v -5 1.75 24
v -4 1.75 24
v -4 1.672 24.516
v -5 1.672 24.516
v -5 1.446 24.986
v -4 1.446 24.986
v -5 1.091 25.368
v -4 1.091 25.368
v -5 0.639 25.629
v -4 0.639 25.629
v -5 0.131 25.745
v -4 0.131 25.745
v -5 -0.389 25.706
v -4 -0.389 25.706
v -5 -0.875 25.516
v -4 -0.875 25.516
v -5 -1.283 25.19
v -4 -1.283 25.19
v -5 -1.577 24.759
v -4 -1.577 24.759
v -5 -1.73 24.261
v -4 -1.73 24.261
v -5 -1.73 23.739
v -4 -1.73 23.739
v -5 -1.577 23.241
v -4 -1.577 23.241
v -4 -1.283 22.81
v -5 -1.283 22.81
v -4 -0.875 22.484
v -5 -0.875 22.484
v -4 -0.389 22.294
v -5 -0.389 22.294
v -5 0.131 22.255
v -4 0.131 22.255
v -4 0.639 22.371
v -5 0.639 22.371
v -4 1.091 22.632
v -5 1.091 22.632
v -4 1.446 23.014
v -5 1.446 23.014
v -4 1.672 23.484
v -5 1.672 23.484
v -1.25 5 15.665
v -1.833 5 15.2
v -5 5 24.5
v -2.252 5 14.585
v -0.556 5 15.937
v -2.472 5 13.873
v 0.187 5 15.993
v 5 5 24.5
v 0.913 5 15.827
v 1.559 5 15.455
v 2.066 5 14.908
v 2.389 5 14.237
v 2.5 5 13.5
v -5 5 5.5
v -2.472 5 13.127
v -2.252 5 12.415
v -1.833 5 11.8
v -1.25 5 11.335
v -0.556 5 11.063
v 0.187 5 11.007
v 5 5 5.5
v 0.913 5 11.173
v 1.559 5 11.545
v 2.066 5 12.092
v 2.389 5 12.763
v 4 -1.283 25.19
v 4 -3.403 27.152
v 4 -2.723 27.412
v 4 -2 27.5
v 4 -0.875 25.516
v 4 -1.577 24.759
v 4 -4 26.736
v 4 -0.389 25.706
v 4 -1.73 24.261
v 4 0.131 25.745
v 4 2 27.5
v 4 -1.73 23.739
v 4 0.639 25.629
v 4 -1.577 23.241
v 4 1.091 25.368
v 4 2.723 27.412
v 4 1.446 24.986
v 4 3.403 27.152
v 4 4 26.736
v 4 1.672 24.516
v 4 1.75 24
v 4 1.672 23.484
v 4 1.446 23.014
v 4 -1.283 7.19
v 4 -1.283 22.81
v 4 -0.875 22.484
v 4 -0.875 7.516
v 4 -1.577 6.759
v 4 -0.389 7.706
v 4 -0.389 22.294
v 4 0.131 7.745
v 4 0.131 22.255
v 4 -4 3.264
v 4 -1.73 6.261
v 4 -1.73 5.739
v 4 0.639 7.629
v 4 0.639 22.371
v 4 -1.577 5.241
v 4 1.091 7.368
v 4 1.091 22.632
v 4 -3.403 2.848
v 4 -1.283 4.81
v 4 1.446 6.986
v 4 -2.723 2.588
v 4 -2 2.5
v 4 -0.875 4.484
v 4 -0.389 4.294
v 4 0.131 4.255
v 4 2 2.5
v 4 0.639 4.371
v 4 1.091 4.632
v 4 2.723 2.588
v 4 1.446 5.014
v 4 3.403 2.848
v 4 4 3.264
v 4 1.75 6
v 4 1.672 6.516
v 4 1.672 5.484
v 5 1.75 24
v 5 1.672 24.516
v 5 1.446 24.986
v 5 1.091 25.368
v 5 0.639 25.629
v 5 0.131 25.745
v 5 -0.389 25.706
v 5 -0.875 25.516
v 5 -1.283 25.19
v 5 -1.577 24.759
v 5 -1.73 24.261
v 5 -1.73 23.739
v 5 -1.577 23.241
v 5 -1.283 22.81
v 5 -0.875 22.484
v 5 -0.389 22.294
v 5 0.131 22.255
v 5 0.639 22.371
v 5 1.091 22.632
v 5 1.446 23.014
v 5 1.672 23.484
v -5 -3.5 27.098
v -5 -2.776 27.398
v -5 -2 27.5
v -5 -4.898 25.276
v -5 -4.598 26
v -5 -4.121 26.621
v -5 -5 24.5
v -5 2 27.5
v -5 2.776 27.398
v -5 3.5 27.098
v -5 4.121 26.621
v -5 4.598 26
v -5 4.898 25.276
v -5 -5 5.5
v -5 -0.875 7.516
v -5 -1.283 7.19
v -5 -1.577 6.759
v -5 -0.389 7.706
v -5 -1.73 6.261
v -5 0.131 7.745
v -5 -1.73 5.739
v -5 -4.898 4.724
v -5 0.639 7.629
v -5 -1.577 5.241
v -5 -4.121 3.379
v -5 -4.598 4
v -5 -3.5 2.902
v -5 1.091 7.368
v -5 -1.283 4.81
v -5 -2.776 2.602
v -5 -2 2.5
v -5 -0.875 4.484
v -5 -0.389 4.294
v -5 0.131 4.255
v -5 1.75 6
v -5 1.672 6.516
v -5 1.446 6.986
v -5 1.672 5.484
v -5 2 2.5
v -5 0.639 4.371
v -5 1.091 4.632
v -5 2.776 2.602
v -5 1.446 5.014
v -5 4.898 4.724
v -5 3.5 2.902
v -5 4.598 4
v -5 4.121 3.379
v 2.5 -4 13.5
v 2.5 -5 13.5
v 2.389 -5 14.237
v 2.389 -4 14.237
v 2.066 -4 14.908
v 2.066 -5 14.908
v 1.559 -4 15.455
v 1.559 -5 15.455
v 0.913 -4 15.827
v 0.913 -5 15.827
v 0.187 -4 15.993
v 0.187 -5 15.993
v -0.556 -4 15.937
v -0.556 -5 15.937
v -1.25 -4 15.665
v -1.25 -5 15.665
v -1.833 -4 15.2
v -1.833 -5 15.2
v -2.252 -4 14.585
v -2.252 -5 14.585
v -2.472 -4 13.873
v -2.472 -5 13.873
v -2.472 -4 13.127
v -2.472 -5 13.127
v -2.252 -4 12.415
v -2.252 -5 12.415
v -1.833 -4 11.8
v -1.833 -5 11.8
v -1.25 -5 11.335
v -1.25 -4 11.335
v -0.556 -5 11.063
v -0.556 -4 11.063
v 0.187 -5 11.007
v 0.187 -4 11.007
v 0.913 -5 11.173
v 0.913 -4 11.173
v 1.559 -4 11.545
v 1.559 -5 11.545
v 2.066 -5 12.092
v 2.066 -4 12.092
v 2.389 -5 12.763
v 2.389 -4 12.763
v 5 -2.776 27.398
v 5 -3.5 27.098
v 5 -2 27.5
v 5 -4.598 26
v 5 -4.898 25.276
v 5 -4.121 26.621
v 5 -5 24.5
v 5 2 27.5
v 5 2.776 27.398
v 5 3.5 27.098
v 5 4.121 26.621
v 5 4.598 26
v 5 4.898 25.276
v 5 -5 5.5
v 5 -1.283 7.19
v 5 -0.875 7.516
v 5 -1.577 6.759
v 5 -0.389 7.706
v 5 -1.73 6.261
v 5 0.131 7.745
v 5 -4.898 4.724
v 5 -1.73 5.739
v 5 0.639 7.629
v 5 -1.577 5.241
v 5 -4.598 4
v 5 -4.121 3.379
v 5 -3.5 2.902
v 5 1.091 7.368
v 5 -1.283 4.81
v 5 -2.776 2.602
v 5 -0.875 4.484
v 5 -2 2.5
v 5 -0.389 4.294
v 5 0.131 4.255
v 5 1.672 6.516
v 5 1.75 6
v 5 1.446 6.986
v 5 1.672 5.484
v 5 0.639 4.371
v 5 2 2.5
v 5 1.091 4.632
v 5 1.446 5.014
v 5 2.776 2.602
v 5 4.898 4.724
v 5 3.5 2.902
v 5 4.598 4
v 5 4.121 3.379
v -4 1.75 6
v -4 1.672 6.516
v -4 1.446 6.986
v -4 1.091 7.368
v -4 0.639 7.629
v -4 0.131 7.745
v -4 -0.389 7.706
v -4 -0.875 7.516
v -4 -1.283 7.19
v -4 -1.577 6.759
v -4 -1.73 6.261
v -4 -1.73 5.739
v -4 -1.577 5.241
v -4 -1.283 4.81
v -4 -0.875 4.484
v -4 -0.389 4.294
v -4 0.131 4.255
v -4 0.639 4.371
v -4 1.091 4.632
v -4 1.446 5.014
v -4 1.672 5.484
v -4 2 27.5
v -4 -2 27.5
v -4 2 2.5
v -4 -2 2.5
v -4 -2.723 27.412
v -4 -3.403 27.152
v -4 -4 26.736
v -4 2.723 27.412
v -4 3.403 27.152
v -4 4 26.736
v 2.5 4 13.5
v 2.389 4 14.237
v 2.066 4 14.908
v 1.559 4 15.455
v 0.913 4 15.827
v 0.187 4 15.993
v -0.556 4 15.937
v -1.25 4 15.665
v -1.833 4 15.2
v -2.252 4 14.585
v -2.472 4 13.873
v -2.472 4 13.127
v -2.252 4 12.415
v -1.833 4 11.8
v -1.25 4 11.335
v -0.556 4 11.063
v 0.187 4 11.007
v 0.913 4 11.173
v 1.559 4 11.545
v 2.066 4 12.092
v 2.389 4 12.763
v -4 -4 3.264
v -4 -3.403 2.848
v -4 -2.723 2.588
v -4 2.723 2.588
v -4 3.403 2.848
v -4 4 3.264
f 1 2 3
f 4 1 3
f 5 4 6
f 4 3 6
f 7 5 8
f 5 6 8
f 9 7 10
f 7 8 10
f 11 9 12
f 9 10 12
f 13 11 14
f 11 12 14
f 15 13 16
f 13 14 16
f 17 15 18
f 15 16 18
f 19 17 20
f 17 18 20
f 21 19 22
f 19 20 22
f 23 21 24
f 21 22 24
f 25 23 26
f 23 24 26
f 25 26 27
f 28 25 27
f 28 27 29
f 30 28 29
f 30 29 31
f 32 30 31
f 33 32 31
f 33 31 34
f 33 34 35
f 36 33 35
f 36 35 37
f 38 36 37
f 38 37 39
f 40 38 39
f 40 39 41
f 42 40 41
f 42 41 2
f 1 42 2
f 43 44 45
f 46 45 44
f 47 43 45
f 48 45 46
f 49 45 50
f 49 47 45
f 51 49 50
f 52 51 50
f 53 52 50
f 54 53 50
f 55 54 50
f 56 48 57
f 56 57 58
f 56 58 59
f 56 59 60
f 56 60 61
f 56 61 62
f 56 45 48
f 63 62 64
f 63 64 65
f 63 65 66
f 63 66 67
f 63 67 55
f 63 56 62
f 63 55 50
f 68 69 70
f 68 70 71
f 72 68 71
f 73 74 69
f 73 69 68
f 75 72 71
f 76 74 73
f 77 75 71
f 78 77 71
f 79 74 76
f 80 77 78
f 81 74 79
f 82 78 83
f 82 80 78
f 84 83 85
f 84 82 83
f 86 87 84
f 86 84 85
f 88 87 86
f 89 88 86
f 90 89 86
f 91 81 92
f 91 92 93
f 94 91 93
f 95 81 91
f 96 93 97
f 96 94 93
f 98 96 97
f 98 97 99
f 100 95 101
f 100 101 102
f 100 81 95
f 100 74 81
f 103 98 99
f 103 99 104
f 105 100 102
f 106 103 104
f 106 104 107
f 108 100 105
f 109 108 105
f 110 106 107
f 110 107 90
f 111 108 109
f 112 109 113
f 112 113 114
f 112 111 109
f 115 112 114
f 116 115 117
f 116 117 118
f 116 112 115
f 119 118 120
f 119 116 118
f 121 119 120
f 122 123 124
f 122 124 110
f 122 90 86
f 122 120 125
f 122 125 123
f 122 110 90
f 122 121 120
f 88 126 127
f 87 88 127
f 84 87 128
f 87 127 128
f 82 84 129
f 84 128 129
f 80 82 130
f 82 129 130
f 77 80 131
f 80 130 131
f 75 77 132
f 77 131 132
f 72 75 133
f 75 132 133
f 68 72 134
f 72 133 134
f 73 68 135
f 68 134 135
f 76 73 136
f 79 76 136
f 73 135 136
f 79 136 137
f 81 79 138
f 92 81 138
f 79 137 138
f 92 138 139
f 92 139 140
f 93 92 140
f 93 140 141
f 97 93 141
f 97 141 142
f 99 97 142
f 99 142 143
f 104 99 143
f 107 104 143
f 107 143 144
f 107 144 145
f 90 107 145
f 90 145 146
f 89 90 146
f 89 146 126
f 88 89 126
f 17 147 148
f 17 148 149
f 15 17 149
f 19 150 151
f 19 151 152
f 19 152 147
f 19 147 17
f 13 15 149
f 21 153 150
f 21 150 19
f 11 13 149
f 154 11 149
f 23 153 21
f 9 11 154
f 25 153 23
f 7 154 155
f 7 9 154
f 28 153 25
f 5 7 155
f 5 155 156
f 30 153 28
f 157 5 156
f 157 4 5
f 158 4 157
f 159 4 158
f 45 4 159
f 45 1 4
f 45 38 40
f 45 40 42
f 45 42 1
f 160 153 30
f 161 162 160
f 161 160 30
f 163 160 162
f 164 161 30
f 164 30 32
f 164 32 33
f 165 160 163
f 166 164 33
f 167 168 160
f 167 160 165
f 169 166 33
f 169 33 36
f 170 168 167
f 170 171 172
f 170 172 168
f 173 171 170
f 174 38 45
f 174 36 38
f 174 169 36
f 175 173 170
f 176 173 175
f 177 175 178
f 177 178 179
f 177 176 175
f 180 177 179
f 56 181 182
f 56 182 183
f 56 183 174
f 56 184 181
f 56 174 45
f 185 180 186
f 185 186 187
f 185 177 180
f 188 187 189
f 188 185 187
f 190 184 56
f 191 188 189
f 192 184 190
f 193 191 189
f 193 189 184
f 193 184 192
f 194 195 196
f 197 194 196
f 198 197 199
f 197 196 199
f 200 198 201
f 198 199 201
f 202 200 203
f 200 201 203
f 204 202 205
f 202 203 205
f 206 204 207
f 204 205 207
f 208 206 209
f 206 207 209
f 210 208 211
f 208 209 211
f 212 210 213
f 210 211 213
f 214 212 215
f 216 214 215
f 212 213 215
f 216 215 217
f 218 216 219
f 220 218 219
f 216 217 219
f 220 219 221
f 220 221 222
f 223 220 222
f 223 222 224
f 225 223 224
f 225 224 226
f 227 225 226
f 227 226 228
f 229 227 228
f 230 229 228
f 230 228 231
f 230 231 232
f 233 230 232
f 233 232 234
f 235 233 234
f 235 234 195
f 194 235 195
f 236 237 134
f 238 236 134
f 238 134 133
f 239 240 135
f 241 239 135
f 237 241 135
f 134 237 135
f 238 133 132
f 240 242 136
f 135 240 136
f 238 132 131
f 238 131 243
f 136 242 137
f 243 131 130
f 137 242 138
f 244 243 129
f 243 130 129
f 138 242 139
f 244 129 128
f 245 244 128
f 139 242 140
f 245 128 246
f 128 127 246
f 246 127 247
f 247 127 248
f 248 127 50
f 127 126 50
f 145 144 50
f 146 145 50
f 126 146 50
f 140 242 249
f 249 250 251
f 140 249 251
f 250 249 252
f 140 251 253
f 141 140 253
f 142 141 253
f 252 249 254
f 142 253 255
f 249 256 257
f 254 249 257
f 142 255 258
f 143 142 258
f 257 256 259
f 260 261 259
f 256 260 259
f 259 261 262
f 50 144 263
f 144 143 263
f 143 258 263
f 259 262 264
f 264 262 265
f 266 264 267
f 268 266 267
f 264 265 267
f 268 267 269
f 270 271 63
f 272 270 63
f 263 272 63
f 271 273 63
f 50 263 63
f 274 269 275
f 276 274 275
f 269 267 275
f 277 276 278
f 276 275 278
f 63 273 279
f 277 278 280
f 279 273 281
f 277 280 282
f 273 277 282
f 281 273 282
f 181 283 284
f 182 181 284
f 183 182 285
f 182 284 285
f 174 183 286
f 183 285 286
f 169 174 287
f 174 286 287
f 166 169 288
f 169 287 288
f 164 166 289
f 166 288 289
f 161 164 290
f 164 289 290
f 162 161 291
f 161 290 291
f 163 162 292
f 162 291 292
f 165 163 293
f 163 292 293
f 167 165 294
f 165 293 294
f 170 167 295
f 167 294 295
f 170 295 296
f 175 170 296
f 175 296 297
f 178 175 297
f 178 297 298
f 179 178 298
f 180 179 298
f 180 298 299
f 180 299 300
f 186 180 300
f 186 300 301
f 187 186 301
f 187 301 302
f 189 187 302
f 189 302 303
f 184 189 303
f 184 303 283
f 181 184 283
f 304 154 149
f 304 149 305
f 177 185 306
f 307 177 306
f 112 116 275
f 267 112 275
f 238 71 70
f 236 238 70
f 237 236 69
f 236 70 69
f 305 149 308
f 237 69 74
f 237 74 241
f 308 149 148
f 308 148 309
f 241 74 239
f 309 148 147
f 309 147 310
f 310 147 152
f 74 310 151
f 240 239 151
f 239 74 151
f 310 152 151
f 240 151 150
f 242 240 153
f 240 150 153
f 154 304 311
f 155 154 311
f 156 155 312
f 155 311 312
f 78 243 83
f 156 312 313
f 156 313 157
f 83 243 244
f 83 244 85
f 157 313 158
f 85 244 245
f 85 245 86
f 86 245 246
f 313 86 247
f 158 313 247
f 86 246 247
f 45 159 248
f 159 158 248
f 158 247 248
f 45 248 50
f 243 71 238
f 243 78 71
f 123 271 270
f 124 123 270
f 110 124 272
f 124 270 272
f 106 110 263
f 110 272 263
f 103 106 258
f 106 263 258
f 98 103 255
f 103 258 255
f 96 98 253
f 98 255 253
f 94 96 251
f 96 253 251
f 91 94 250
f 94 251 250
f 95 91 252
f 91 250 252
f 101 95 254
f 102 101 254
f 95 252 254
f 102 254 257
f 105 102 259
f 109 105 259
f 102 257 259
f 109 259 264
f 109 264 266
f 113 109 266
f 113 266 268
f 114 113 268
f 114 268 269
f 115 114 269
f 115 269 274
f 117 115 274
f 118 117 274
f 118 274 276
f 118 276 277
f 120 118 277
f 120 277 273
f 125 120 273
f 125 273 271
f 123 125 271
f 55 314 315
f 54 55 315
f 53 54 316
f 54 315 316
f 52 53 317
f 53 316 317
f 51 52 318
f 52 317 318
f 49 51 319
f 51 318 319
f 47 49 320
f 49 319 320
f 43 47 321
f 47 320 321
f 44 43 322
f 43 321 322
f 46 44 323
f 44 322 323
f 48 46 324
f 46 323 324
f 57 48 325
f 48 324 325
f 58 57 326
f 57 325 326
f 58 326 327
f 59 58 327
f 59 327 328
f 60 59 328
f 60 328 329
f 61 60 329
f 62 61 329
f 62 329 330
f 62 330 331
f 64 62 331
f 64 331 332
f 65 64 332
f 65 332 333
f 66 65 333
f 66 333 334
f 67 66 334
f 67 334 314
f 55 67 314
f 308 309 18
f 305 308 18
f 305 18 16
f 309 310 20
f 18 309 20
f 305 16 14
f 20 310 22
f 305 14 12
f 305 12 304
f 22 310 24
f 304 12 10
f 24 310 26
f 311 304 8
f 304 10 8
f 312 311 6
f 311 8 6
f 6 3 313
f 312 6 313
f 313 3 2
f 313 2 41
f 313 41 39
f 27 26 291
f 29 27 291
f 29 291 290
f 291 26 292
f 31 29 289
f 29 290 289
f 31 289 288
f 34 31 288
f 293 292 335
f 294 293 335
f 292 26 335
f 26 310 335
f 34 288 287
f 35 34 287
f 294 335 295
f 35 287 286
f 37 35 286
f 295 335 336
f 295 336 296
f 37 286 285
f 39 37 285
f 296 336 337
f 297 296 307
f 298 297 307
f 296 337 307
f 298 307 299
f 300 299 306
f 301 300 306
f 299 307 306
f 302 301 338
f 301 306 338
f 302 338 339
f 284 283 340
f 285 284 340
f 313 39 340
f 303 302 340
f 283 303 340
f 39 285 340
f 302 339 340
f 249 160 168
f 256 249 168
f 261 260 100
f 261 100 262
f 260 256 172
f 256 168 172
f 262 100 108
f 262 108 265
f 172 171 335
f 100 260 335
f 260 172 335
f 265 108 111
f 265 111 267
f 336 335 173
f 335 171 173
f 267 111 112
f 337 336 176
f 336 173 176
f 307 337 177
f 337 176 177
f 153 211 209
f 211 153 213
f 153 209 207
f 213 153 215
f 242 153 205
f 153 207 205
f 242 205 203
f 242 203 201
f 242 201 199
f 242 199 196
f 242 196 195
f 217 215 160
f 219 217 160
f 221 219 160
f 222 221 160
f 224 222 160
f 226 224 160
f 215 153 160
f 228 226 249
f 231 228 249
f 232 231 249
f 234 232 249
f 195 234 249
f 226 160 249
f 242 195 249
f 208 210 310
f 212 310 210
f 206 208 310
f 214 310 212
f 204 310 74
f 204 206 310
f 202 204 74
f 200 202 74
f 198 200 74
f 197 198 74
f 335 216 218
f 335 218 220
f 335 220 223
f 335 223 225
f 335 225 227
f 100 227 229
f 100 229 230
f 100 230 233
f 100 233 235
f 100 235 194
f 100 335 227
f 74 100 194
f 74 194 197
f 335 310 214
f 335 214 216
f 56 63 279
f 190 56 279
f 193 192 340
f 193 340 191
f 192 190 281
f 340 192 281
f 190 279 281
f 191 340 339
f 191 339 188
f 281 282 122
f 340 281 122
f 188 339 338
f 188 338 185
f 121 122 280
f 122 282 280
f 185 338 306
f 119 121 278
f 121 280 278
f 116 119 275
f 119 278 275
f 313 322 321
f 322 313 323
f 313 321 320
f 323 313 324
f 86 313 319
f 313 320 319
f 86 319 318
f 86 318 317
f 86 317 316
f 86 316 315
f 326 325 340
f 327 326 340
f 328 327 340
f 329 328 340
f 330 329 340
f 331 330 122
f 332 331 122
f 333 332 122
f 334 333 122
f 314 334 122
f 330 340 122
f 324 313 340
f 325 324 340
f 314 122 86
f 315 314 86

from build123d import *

# Parameters (mm, degrees)
SKIZZE1_W                       = 10
SKIZZE1_H                       = 10
SKIZZE1_W_2                     = 8
SKIZZE1_H_2                     = 8
AUFSATZ_LINEAR_AUSTRAGEN1_DEPTH = 30
SKIZZE2_R                       = 1.75
SCHNITT_LINEAR_AUSTRAGEN1_DEPTH = 35
SKIZZE3_R                       = 2.5
SCHNITT_LINEAR_AUSTRAGEN2_DEPTH = 17
FL_CHE_START                    = 27.5
FL_CHE_VERSCHIEBEN1_OUTLINE_W   = 10
FL_CHE_VERSCHIEBEN1_OUTLINE_H   = 10
FL_CHE_VERSCHIEBEN1_OUTLINE_W_2 = 8
FL_CHE_VERSCHIEBEN1_OUTLINE_H_2 = 8
FL_CHE_VERSCHIEBEN1_DEPTH       = 2.5
FL_CHE_VERSCHIEBEN2_OUTLINE_W   = 10
FL_CHE_VERSCHIEBEN2_OUTLINE_H   = 10
FL_CHE_VERSCHIEBEN2_OUTLINE_W_2 = 8
FL_CHE_VERSCHIEBEN2_OUTLINE_H_2 = 8
FL_CHE_VERSCHIEBEN2_DEPTH       = 2.5
VERRUNDUNG1_R                   = 3


# Read off the part's stored shape, not the designer's step: Fläche verschieben1, Fläche verschieben2
with BuildPart() as part:
    # Skizze1 → Aufsatz-Linear austragen1 (new body)
    with BuildSketch(Plane.XY):
        Rectangle(SKIZZE1_W, SKIZZE1_H)
        Rectangle(SKIZZE1_W_2, SKIZZE1_H_2, mode=Mode.SUBTRACT)
    extrude(amount=AUFSATZ_LINEAR_AUSTRAGEN1_DEPTH)

    # Skizze2 → Schnitt-Linear austragen1 (cut)
    with BuildSketch(Plane(origin=(5, 0, 0), x_dir=(0, 0, -1), z_dir=(1, 0, 0))):
        with Locations(Location((-6, 0, 0), (0, 0, 90))):
            Circle(SKIZZE2_R)
        with Locations(Location((-24, 0, 0), (0, 0, 90))):
            Circle(SKIZZE2_R)
    extrude(amount=-SCHNITT_LINEAR_AUSTRAGEN1_DEPTH, mode=Mode.SUBTRACT)

    # Skizze3 → Schnitt-Linear austragen2 (cut)
    with BuildSketch(Plane.XZ.offset(5)):
        with Locations((0, 13.5)):
            Circle(SKIZZE3_R)
    extrude(amount=-SCHNITT_LINEAR_AUSTRAGEN2_DEPTH, mode=Mode.SUBTRACT)

    # Fläche verschieben1 outline → Fläche verschieben1 (cut)
    with BuildSketch(Plane.XY.offset(FL_CHE_START)):
        Rectangle(FL_CHE_VERSCHIEBEN1_OUTLINE_W, FL_CHE_VERSCHIEBEN1_OUTLINE_H)
        Rectangle(FL_CHE_VERSCHIEBEN1_OUTLINE_W_2, FL_CHE_VERSCHIEBEN1_OUTLINE_H_2, mode=Mode.SUBTRACT)
    extrude(amount=FL_CHE_VERSCHIEBEN1_DEPTH, mode=Mode.SUBTRACT)

    # Fläche verschieben2 outline → Fläche verschieben2 (cut)
    with BuildSketch(Plane.XY):
        Rectangle(FL_CHE_VERSCHIEBEN2_OUTLINE_W, FL_CHE_VERSCHIEBEN2_OUTLINE_H)
        Rectangle(FL_CHE_VERSCHIEBEN2_OUTLINE_W_2, FL_CHE_VERSCHIEBEN2_OUTLINE_H_2, mode=Mode.SUBTRACT)
    extrude(amount=FL_CHE_VERSCHIEBEN2_DEPTH, mode=Mode.SUBTRACT)

    # Verrundung1
    # the kernel refuses this fillet: 3 mm, written as the material it takes off along each edge
    with BuildSketch(Plane(origin=(-12.5, -5, 2.5), x_dir=(0, 0, 1), z_dir=(1, 0, 0)), Plane(origin=(12.5, 5, 27.5), x_dir=(0, -1, 0), z_dir=(-1, 0, 0))) as verrundung1_piece_1:
        with BuildLine():
            CenterArc((VERRUNDUNG1_R, -VERRUNDUNG1_R), VERRUNDUNG1_R, 90, 90)
            Line((0, -VERRUNDUNG1_R), (0, 0))
            Line((0, 0), (VERRUNDUNG1_R, 0))
        make_face()
    extrude(amount=25, mode=Mode.SUBTRACT)
    with BuildSketch(Plane(origin=(12.5, 5, 2.5), x_dir=(0, -1, 0), z_dir=(-1, 0, 0)), Plane(origin=(-12.5, -5, 27.5), x_dir=(0, 0, -1), z_dir=(1, 0, 0))) as verrundung1_piece_2:
        with BuildLine():
            CenterArc((VERRUNDUNG1_R, VERRUNDUNG1_R), VERRUNDUNG1_R, 180, 90)
            Line((0, VERRUNDUNG1_R), (0, 0))
            Line((0, 0), (VERRUNDUNG1_R, 0))
        make_face()
    extrude(amount=25, mode=Mode.SUBTRACT)


solid = part.part
